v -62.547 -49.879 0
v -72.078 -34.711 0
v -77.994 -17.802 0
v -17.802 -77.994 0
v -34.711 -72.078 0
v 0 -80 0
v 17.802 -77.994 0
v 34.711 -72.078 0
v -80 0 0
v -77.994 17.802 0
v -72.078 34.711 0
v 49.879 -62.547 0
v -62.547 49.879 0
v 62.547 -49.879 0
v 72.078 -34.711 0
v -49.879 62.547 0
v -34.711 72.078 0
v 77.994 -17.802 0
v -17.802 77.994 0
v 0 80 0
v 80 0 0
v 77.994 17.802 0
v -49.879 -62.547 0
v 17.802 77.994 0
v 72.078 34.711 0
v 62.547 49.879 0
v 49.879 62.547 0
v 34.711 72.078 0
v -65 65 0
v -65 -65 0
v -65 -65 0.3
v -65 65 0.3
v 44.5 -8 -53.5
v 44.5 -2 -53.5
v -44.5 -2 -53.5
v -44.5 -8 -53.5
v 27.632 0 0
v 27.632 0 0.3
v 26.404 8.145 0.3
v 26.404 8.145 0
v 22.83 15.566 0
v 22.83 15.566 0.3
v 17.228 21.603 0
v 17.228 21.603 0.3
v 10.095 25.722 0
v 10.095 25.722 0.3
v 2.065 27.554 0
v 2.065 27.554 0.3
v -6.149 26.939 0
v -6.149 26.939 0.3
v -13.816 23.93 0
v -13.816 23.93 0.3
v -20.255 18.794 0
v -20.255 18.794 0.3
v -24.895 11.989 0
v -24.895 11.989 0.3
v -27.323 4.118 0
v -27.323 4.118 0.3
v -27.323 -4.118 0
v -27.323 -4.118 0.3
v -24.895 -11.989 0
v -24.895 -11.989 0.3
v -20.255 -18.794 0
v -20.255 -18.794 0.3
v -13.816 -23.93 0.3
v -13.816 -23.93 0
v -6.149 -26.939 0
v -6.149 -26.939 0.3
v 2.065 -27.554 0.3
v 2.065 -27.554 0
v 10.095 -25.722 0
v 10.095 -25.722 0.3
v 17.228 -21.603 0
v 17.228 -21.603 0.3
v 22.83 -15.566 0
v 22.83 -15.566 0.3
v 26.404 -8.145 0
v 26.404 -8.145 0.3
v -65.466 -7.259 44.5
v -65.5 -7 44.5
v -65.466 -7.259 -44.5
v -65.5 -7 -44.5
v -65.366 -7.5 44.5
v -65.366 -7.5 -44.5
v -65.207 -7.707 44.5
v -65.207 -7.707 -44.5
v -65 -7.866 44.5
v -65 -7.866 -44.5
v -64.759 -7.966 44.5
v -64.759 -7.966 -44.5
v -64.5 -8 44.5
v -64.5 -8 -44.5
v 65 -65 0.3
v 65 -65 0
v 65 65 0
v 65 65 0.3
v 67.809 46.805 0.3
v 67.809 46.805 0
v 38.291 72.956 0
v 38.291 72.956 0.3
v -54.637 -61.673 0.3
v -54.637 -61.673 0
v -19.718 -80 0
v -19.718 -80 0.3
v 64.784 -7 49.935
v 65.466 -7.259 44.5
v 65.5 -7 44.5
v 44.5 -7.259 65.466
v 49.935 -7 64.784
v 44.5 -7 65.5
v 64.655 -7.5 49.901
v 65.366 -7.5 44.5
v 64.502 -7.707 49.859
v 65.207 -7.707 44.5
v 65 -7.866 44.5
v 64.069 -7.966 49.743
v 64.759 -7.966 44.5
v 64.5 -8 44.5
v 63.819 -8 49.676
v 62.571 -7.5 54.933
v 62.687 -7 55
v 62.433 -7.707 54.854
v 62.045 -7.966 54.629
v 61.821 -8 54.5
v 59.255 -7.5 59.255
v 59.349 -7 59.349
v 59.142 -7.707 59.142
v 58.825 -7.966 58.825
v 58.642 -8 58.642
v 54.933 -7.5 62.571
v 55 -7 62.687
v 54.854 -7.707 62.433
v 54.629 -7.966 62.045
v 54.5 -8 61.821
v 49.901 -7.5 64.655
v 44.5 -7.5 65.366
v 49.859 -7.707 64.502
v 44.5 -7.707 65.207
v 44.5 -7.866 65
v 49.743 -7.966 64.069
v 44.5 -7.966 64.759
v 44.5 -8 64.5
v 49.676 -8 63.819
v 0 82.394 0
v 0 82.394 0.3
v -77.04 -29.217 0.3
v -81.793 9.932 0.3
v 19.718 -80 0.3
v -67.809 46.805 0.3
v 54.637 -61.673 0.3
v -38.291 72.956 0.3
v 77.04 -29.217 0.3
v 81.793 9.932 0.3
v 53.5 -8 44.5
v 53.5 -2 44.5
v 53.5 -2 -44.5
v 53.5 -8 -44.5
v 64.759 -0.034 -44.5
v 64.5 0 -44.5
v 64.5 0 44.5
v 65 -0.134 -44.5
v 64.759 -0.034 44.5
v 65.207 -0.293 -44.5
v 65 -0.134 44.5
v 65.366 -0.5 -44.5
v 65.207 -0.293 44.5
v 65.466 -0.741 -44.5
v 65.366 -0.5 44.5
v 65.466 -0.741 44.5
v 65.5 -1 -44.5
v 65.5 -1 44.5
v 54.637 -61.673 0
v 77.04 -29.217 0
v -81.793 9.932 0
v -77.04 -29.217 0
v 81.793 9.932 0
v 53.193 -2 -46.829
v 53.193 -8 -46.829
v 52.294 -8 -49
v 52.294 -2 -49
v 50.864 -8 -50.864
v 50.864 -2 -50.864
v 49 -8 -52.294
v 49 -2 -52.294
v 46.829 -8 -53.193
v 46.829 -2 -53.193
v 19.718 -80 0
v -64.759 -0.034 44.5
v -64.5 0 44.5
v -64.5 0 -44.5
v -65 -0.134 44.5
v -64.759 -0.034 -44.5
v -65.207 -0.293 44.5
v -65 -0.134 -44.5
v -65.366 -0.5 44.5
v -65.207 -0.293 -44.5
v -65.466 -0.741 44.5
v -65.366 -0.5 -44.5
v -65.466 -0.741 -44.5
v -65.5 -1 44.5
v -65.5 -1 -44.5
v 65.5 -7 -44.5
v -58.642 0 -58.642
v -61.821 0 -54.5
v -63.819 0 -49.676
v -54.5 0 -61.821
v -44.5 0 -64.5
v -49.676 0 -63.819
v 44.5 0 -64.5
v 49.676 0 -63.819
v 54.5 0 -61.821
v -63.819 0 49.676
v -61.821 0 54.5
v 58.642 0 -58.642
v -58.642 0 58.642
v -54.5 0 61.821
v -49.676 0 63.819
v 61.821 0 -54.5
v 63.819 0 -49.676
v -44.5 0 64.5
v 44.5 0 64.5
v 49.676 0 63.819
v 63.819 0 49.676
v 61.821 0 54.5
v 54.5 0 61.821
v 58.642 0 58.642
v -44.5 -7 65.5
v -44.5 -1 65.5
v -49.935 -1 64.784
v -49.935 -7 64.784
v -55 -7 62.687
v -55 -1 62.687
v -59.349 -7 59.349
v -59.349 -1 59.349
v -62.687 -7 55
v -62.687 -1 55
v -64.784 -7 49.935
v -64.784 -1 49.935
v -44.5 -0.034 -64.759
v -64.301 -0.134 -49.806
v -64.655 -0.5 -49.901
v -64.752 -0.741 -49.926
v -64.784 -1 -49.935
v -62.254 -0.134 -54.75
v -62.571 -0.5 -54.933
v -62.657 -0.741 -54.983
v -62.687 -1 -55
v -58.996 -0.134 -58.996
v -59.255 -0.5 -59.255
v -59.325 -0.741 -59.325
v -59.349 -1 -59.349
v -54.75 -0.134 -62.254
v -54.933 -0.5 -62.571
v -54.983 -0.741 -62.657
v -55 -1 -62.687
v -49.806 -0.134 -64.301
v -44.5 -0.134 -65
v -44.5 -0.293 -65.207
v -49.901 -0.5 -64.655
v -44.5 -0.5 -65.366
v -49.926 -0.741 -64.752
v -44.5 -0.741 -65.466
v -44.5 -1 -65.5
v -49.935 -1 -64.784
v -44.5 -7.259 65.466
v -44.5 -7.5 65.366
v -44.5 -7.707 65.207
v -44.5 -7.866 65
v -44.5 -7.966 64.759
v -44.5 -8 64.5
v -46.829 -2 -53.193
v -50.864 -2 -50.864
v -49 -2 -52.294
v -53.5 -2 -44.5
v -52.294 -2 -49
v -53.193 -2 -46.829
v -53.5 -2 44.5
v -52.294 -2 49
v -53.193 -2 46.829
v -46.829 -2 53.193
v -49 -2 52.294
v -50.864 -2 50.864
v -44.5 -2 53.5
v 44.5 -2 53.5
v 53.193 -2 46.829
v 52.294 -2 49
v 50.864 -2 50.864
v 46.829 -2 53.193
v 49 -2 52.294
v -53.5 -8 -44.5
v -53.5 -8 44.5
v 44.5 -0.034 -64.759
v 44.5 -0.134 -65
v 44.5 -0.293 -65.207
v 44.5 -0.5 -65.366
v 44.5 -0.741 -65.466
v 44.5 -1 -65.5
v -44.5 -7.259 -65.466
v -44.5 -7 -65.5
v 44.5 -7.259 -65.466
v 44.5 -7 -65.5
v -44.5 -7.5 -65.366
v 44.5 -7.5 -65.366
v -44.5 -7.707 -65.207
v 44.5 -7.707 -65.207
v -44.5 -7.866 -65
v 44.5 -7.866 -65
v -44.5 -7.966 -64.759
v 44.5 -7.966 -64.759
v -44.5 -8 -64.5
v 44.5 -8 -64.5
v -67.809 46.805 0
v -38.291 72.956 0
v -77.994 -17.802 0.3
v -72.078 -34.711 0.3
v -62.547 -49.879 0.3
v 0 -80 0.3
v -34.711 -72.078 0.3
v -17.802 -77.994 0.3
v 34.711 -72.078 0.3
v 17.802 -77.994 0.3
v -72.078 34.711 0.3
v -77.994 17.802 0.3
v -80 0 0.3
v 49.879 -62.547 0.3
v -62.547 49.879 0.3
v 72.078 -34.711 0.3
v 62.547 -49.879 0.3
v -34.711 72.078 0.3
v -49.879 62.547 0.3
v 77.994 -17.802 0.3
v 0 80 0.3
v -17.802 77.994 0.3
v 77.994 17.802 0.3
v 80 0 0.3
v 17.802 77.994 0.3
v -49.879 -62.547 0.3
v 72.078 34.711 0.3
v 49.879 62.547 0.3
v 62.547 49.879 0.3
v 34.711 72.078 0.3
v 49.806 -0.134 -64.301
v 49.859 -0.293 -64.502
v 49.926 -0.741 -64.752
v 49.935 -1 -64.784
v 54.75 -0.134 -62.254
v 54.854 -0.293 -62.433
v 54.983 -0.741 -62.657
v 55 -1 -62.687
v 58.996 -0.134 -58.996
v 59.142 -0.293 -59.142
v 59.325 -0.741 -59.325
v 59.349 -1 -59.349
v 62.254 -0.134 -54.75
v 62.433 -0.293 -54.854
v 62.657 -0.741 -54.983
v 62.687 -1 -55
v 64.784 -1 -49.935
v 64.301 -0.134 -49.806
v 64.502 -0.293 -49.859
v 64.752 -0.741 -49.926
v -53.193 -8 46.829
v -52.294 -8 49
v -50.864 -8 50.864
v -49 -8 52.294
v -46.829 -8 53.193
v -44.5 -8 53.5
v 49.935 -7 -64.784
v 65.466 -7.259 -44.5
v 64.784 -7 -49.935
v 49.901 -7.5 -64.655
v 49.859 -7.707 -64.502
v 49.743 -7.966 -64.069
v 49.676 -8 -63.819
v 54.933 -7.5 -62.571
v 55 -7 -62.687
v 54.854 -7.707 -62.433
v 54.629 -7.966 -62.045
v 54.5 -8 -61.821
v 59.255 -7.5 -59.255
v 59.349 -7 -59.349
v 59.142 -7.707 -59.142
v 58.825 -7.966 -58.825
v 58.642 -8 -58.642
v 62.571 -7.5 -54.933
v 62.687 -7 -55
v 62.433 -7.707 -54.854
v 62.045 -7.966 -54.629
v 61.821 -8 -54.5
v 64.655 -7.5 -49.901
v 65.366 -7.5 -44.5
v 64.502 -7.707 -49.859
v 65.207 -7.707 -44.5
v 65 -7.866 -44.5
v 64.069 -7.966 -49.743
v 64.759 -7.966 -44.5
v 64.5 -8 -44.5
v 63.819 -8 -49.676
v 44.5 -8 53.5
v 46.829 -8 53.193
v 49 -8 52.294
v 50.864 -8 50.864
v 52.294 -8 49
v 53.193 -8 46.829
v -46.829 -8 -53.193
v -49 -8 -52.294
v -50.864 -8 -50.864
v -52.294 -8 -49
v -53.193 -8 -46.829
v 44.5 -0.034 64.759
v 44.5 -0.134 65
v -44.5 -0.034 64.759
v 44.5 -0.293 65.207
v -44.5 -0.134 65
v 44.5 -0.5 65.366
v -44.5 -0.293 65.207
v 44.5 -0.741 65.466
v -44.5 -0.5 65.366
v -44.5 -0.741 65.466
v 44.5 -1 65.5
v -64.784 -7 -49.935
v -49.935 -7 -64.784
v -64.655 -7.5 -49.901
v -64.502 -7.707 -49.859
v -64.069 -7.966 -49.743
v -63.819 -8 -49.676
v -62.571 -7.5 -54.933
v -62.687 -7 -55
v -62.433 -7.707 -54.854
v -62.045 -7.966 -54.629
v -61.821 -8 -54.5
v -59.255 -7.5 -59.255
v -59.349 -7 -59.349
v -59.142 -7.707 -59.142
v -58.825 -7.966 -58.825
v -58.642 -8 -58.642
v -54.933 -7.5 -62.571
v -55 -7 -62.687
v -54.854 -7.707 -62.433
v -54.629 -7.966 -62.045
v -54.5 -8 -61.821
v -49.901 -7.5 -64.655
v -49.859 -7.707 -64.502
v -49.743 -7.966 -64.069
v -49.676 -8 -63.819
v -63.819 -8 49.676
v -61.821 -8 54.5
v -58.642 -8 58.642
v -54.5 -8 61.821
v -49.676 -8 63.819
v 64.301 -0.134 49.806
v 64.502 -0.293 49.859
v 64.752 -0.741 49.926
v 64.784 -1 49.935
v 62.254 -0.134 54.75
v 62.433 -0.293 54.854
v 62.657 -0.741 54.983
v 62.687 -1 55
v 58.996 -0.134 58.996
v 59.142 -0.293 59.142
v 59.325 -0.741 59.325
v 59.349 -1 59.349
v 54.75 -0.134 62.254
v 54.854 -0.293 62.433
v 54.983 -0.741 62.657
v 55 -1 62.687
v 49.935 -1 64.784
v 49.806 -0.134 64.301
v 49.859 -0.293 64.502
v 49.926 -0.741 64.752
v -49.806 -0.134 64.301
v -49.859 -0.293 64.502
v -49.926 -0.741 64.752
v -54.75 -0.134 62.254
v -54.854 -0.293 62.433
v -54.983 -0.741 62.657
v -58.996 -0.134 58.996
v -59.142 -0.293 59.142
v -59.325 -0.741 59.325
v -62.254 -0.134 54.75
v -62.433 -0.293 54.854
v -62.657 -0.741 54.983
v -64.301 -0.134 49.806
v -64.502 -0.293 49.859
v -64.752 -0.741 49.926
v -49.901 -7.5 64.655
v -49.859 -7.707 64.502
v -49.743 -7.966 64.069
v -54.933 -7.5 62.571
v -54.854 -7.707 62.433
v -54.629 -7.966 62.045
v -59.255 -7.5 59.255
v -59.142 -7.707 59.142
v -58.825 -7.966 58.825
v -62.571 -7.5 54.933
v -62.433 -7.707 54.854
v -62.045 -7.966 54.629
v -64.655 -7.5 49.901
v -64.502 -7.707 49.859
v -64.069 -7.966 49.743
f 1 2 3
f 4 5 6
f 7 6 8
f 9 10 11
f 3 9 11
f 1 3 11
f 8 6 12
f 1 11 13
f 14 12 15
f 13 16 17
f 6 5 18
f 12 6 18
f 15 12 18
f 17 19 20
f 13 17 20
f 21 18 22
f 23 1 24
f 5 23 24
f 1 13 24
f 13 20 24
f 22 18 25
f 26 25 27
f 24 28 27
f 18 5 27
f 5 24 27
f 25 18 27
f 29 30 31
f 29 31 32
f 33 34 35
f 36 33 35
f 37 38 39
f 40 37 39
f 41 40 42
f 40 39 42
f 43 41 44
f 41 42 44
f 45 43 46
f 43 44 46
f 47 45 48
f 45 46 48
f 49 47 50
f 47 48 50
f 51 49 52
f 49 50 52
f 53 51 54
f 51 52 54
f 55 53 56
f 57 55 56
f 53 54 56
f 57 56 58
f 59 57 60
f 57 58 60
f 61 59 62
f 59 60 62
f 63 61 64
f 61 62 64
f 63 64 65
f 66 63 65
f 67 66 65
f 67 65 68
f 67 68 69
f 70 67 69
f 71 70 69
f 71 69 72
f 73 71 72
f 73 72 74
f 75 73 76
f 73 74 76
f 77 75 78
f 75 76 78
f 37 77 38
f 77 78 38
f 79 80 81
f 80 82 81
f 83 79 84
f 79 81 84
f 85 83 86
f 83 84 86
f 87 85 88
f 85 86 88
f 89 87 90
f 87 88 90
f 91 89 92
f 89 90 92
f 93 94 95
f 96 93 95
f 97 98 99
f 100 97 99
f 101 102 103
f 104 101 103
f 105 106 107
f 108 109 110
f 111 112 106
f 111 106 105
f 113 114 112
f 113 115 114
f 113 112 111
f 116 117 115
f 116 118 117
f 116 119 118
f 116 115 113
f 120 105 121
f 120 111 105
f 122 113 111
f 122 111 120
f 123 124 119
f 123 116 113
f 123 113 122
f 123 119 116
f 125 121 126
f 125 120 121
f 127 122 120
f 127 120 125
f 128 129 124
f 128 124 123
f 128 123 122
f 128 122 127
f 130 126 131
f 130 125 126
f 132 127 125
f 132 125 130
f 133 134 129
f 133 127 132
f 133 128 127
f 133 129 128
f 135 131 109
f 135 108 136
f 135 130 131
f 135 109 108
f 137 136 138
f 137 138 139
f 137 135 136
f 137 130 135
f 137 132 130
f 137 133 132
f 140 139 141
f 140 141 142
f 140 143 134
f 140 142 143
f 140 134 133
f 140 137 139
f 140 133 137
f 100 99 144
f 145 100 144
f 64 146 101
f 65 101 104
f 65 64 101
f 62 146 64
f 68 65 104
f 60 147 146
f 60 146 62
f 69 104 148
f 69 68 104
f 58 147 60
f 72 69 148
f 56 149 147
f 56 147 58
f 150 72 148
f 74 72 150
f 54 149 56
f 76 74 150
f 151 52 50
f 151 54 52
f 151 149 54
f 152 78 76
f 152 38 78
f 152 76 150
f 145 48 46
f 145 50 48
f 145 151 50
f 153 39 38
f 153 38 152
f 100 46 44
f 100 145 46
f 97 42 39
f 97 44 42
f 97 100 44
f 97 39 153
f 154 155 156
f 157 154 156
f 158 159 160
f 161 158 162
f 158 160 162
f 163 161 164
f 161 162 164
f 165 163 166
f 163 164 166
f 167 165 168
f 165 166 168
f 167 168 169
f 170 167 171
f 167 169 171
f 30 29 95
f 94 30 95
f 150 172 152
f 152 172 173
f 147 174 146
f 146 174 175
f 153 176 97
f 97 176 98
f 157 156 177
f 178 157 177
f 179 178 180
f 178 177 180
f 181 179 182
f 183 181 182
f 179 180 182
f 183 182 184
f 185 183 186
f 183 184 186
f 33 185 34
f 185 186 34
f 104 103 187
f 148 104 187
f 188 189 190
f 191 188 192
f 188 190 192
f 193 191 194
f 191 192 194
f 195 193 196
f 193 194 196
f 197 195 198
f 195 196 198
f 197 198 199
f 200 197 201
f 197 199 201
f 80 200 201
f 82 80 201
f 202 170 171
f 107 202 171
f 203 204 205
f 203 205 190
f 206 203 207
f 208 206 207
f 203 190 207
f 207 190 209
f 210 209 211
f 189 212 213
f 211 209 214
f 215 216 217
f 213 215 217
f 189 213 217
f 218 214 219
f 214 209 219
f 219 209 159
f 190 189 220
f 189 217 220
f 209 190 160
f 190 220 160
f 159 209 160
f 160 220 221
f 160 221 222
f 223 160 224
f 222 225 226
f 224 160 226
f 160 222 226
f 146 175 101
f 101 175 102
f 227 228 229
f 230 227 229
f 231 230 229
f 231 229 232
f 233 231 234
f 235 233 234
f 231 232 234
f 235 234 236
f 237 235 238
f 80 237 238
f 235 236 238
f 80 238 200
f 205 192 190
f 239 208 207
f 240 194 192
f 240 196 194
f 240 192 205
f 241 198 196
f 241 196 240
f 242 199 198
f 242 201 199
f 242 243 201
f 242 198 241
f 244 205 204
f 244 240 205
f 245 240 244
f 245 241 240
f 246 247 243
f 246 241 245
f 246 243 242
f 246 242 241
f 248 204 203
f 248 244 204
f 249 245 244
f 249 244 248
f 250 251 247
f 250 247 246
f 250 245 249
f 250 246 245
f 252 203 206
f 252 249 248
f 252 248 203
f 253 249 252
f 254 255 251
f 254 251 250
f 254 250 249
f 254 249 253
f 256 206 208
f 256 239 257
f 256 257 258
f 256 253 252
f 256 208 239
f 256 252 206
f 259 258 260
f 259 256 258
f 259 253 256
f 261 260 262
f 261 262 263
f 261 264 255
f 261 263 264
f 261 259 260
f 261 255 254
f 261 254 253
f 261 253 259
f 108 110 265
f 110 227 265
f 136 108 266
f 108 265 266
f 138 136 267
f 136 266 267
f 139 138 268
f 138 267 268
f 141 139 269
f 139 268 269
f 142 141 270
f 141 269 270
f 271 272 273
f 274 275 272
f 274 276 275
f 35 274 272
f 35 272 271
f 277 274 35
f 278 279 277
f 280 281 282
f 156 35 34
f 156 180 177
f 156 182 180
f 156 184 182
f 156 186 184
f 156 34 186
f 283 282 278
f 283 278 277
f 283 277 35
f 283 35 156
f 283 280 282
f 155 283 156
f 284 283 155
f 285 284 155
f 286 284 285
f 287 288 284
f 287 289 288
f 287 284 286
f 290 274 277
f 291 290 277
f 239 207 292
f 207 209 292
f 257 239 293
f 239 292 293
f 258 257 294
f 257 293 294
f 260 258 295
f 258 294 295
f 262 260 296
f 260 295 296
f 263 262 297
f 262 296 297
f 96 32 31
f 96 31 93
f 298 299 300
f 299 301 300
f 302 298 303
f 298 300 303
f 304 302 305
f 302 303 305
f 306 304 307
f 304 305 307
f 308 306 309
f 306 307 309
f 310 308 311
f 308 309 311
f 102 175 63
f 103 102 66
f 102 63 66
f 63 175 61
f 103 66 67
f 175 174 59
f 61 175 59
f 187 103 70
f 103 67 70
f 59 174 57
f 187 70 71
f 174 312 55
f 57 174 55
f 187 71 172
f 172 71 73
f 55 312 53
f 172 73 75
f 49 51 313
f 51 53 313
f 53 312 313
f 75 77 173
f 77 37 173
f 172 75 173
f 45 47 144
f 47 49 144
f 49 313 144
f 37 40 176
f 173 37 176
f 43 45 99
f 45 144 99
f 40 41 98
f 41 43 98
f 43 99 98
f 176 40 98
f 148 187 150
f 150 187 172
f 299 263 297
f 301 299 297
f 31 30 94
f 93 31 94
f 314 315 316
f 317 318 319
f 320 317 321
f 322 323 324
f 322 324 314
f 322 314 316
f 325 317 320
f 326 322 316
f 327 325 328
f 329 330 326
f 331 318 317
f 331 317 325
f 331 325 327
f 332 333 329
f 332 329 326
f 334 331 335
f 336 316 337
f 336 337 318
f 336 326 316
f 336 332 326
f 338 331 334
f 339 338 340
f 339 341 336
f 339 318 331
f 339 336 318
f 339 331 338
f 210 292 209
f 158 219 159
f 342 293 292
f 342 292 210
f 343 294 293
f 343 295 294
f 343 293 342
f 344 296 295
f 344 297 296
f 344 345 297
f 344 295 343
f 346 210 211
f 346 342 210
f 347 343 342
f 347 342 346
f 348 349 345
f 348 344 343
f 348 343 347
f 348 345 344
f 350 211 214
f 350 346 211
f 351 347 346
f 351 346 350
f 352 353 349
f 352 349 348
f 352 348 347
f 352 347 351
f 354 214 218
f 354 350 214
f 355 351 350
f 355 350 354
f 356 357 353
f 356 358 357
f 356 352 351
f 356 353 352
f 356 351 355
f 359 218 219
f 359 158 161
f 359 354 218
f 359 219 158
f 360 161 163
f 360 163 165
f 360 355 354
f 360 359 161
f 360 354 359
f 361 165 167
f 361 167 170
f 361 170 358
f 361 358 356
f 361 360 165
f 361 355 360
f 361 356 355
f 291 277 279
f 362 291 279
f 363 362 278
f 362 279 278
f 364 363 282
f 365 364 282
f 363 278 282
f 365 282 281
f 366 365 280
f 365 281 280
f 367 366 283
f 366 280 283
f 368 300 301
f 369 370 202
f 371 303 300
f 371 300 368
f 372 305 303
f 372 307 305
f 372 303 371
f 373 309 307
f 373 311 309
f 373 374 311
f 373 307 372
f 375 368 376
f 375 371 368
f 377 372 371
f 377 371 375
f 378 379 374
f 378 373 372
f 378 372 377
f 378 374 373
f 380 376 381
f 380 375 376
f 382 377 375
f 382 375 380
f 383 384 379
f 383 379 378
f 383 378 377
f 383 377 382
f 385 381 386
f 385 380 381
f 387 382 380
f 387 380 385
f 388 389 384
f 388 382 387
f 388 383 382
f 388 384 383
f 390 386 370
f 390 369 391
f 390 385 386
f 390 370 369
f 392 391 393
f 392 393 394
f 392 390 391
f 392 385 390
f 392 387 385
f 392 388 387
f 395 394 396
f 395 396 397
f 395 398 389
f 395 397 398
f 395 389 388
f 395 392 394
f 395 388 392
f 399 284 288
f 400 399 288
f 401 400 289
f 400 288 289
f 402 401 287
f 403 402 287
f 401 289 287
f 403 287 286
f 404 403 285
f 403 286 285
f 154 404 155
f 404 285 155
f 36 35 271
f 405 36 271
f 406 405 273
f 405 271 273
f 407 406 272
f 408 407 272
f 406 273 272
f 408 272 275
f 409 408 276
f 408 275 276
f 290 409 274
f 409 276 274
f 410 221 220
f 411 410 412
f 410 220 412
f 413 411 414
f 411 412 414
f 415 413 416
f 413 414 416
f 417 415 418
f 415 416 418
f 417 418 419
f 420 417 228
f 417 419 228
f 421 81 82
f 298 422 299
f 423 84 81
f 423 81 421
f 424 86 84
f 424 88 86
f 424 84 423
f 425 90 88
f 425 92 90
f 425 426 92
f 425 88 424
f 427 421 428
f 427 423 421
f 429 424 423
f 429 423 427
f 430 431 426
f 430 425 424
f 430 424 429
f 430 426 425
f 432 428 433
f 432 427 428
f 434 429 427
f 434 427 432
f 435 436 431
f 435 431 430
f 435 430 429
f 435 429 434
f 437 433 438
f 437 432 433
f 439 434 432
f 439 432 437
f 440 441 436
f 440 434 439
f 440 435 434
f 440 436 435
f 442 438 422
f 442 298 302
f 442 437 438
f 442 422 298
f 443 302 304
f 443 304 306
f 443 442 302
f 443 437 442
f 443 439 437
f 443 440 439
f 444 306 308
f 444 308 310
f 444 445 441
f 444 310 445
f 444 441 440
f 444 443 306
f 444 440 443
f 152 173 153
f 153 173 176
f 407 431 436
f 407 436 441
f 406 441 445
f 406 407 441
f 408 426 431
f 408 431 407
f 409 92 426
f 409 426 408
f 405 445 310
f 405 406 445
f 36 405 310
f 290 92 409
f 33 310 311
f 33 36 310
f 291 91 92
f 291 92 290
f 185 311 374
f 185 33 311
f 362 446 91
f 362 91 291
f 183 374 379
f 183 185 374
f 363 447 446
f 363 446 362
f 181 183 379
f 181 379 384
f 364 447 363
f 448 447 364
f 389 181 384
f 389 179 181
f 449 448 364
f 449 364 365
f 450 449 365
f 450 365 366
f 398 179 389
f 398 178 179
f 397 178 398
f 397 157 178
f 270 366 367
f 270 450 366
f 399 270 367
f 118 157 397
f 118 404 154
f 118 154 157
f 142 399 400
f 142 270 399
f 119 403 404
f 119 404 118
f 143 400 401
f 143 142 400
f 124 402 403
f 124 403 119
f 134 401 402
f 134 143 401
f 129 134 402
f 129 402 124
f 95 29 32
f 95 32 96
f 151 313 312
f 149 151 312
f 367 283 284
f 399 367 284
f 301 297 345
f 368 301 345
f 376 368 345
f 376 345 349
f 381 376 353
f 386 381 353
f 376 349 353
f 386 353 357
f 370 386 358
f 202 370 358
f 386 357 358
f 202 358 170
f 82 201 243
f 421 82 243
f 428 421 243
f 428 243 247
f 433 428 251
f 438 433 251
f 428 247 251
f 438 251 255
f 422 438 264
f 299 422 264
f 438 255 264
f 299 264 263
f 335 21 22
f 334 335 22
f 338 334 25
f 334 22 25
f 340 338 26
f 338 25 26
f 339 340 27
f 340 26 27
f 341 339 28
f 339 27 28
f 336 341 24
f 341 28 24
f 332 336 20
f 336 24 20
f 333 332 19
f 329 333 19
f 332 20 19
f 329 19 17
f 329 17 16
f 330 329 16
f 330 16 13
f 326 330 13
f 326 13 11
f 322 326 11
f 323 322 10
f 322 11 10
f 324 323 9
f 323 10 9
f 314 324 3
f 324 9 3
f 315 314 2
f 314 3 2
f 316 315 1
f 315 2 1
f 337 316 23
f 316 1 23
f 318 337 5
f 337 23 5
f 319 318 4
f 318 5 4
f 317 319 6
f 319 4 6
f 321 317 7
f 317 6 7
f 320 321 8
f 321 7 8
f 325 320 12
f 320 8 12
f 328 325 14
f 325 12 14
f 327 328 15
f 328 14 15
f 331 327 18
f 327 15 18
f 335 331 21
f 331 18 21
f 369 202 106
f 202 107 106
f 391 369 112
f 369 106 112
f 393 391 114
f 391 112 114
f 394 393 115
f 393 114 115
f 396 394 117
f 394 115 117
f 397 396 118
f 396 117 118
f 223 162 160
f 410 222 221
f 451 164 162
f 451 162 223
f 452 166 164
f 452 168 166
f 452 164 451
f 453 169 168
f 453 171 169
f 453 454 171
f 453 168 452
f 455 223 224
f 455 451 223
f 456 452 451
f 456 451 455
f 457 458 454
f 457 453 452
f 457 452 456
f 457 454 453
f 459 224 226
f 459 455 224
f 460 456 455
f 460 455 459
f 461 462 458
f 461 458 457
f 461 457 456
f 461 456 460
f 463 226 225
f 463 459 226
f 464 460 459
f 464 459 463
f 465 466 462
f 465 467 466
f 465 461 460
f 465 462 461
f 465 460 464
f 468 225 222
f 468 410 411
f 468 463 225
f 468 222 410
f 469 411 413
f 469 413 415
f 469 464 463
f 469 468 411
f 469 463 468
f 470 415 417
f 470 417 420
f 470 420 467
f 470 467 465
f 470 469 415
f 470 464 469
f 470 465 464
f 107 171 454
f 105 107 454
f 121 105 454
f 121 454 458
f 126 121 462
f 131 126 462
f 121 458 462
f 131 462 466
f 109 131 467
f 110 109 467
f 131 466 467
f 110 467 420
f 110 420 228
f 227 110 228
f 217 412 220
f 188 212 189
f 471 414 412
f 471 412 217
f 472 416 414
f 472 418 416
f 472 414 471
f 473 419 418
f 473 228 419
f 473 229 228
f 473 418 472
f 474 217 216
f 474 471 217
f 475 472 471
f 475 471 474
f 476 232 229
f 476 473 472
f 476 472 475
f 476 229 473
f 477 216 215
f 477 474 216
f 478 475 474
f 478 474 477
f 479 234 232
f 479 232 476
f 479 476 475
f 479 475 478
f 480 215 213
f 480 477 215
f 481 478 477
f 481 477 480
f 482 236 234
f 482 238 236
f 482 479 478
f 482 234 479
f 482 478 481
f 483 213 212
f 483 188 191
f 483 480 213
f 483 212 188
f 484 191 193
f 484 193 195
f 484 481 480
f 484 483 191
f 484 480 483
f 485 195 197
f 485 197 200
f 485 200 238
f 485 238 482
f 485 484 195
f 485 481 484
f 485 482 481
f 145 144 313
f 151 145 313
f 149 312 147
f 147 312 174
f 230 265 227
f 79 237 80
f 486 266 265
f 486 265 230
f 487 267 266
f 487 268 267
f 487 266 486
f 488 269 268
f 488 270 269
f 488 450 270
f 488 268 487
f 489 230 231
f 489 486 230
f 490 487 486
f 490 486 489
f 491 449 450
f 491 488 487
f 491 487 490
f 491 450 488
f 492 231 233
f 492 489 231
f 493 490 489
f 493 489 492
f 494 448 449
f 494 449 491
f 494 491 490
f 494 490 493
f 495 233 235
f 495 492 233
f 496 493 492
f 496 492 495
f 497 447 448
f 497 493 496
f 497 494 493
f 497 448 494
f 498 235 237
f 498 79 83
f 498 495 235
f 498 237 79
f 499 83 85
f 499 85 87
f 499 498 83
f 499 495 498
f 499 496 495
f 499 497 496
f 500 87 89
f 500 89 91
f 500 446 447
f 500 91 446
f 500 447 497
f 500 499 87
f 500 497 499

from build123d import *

# Parameters (mm, degrees)
F1_DEPTH  = 2
F2_DEPTH  = 8
F3_R      = 1
F5_DEPTH  = 0.3
F6_R      = 27.6317342949
F7_DEPTH  = 0.3
F8_R      = 80
F9_DEPTH  = 0.3
F10_W     = 130
F10_H     = 130
F11_DEPTH = 0.3


with BuildPart() as f1:
    # F0 (on Front) → F1 (new body)
    with BuildSketch(Plane.XZ):
        with BuildLine():
            Line((65.5, -44.5), (65.5, 44.5))
            ThreePointArc((65.5, 44.5), (59.3492424049, 59.3492424049), (44.5, 65.5))
            Line((44.5, 65.5), (-44.5, 65.5))
            ThreePointArc((-44.5, 65.5), (-59.3492424049, 59.3492424049), (-65.5, 44.5))
            Line((-65.5, 44.5), (-65.5, -44.5))
            ThreePointArc((-65.5, -44.5), (-59.3492424049, -59.3492424049), (-44.5, -65.5))
            Line((-44.5, -65.5), (44.5, -65.5))
            ThreePointArc((44.5, -65.5), (59.3492424049, -59.3492424049), (65.5, -44.5))
        make_face()
        with BuildLine():
            Line((-44.5, 53.5), (44.5, 53.5))
            ThreePointArc((44.5, 53.5), (50.8639610307, 50.8639610307), (53.5, 44.5))
            Line((53.5, 44.5), (53.5, -44.5))
            ThreePointArc((53.5, -44.5), (50.8639610307, -50.8639610307), (44.5, -53.5))
            Line((44.5, -53.5), (-44.5, -53.5))
            ThreePointArc((-44.5, -53.5), (-50.8639610307, -50.8639610307), (-53.5, -44.5))
            Line((-53.5, -44.5), (-53.5, 44.5))
            ThreePointArc((-53.5, 44.5), (-50.8639610307, 50.8639610307), (-44.5, 53.5))
        make_face(mode=Mode.SUBTRACT)
        with BuildLine():
            ThreePointArc((53.5, 44.5), (50.8639610307, 50.8639610307), (44.5, 53.5))
            Line((44.5, 53.5), (-44.5, 53.5))
            ThreePointArc((-44.5, 53.5), (-50.8639610307, 50.8639610307), (-53.5, 44.5))
            Line((-53.5, 44.5), (-53.5, -44.5))
            ThreePointArc((-53.5, -44.5), (-50.8639610307, -50.8639610307), (-44.5, -53.5))
            Line((-44.5, -53.5), (44.5, -53.5))
            ThreePointArc((44.5, -53.5), (50.8639610307, -50.8639610307), (53.5, -44.5))
            Line((53.5, -44.5), (53.5, 44.5))
        make_face()
    extrude(amount=F1_DEPTH)

    # F0 (on Front) → F2 (join)
    with BuildSketch(Plane.XZ):
        with BuildLine():
            Line((65.5, -44.5), (65.5, 44.5))
            ThreePointArc((65.5, 44.5), (59.3492424049, 59.3492424049), (44.5, 65.5))
            Line((44.5, 65.5), (-44.5, 65.5))
            ThreePointArc((-44.5, 65.5), (-59.3492424049, 59.3492424049), (-65.5, 44.5))
            Line((-65.5, 44.5), (-65.5, -44.5))
            ThreePointArc((-65.5, -44.5), (-59.3492424049, -59.3492424049), (-44.5, -65.5))
            Line((-44.5, -65.5), (44.5, -65.5))
            ThreePointArc((44.5, -65.5), (59.3492424049, -59.3492424049), (65.5, -44.5))
        make_face()
        with BuildLine():
            Line((-44.5, 53.5), (44.5, 53.5))
            ThreePointArc((44.5, 53.5), (50.8639610307, 50.8639610307), (53.5, 44.5))
            Line((53.5, 44.5), (53.5, -44.5))
            ThreePointArc((53.5, -44.5), (50.8639610307, -50.8639610307), (44.5, -53.5))
            Line((44.5, -53.5), (-44.5, -53.5))
            ThreePointArc((-44.5, -53.5), (-50.8639610307, -50.8639610307), (-53.5, -44.5))
            Line((-53.5, -44.5), (-53.5, 44.5))
            ThreePointArc((-53.5, 44.5), (-50.8639610307, 50.8639610307), (-44.5, 53.5))
        make_face(mode=Mode.SUBTRACT)
    extrude(amount=F2_DEPTH)

    # F3
    f3_edges = [f1.edges().sort_by_distance(p)[0] for p in [
        (0, 0, -65.5),
        (0, -8, -65.5),
    ]]
    fillet(f3_edges, radius=F3_R)


with BuildPart() as f5:
    # F4 (on Top) → F5 (new body)
    with BuildSketch(Plane.XY):
        Polygon((67.8091190325, 46.8052553952), (38.290506286, 72.9564643122), (0, 82.394226476), (-38.290506286, 72.9564643122), (-67.8091190325, 46.8052553952), (-81.7934797971, 9.9315265316), (-77.0399400585, -29.2173953725), (-54.6374784844, -61.6729641045), (-19.7182290426, -80), (19.7182290426, -80), (54.6374784844, -61.6729641045), (77.0399400585, -29.2173953725), (81.7934797971, 9.9315265316), align=None)
    extrude(amount=F5_DEPTH)

    # F6 (on face) → F7 (cut)
    with BuildSketch(Plane.XY.offset(0.3)):
        Circle(F6_R)
    extrude(amount=-F7_DEPTH, mode=Mode.SUBTRACT)


with BuildPart() as f9:
    # F8 (on Top) → F9 (new body)
    with BuildSketch(Plane.XY):
        Circle(F8_R)
    extrude(amount=F9_DEPTH)


with BuildPart() as f11:
    # F10 (on Top) → F11 (new body)
    with BuildSketch(Plane.XY):
        Rectangle(F10_W, F10_H)
    extrude(amount=F11_DEPTH)


solid = Compound([f1.part, f5.part, f9.part, f11.part])
